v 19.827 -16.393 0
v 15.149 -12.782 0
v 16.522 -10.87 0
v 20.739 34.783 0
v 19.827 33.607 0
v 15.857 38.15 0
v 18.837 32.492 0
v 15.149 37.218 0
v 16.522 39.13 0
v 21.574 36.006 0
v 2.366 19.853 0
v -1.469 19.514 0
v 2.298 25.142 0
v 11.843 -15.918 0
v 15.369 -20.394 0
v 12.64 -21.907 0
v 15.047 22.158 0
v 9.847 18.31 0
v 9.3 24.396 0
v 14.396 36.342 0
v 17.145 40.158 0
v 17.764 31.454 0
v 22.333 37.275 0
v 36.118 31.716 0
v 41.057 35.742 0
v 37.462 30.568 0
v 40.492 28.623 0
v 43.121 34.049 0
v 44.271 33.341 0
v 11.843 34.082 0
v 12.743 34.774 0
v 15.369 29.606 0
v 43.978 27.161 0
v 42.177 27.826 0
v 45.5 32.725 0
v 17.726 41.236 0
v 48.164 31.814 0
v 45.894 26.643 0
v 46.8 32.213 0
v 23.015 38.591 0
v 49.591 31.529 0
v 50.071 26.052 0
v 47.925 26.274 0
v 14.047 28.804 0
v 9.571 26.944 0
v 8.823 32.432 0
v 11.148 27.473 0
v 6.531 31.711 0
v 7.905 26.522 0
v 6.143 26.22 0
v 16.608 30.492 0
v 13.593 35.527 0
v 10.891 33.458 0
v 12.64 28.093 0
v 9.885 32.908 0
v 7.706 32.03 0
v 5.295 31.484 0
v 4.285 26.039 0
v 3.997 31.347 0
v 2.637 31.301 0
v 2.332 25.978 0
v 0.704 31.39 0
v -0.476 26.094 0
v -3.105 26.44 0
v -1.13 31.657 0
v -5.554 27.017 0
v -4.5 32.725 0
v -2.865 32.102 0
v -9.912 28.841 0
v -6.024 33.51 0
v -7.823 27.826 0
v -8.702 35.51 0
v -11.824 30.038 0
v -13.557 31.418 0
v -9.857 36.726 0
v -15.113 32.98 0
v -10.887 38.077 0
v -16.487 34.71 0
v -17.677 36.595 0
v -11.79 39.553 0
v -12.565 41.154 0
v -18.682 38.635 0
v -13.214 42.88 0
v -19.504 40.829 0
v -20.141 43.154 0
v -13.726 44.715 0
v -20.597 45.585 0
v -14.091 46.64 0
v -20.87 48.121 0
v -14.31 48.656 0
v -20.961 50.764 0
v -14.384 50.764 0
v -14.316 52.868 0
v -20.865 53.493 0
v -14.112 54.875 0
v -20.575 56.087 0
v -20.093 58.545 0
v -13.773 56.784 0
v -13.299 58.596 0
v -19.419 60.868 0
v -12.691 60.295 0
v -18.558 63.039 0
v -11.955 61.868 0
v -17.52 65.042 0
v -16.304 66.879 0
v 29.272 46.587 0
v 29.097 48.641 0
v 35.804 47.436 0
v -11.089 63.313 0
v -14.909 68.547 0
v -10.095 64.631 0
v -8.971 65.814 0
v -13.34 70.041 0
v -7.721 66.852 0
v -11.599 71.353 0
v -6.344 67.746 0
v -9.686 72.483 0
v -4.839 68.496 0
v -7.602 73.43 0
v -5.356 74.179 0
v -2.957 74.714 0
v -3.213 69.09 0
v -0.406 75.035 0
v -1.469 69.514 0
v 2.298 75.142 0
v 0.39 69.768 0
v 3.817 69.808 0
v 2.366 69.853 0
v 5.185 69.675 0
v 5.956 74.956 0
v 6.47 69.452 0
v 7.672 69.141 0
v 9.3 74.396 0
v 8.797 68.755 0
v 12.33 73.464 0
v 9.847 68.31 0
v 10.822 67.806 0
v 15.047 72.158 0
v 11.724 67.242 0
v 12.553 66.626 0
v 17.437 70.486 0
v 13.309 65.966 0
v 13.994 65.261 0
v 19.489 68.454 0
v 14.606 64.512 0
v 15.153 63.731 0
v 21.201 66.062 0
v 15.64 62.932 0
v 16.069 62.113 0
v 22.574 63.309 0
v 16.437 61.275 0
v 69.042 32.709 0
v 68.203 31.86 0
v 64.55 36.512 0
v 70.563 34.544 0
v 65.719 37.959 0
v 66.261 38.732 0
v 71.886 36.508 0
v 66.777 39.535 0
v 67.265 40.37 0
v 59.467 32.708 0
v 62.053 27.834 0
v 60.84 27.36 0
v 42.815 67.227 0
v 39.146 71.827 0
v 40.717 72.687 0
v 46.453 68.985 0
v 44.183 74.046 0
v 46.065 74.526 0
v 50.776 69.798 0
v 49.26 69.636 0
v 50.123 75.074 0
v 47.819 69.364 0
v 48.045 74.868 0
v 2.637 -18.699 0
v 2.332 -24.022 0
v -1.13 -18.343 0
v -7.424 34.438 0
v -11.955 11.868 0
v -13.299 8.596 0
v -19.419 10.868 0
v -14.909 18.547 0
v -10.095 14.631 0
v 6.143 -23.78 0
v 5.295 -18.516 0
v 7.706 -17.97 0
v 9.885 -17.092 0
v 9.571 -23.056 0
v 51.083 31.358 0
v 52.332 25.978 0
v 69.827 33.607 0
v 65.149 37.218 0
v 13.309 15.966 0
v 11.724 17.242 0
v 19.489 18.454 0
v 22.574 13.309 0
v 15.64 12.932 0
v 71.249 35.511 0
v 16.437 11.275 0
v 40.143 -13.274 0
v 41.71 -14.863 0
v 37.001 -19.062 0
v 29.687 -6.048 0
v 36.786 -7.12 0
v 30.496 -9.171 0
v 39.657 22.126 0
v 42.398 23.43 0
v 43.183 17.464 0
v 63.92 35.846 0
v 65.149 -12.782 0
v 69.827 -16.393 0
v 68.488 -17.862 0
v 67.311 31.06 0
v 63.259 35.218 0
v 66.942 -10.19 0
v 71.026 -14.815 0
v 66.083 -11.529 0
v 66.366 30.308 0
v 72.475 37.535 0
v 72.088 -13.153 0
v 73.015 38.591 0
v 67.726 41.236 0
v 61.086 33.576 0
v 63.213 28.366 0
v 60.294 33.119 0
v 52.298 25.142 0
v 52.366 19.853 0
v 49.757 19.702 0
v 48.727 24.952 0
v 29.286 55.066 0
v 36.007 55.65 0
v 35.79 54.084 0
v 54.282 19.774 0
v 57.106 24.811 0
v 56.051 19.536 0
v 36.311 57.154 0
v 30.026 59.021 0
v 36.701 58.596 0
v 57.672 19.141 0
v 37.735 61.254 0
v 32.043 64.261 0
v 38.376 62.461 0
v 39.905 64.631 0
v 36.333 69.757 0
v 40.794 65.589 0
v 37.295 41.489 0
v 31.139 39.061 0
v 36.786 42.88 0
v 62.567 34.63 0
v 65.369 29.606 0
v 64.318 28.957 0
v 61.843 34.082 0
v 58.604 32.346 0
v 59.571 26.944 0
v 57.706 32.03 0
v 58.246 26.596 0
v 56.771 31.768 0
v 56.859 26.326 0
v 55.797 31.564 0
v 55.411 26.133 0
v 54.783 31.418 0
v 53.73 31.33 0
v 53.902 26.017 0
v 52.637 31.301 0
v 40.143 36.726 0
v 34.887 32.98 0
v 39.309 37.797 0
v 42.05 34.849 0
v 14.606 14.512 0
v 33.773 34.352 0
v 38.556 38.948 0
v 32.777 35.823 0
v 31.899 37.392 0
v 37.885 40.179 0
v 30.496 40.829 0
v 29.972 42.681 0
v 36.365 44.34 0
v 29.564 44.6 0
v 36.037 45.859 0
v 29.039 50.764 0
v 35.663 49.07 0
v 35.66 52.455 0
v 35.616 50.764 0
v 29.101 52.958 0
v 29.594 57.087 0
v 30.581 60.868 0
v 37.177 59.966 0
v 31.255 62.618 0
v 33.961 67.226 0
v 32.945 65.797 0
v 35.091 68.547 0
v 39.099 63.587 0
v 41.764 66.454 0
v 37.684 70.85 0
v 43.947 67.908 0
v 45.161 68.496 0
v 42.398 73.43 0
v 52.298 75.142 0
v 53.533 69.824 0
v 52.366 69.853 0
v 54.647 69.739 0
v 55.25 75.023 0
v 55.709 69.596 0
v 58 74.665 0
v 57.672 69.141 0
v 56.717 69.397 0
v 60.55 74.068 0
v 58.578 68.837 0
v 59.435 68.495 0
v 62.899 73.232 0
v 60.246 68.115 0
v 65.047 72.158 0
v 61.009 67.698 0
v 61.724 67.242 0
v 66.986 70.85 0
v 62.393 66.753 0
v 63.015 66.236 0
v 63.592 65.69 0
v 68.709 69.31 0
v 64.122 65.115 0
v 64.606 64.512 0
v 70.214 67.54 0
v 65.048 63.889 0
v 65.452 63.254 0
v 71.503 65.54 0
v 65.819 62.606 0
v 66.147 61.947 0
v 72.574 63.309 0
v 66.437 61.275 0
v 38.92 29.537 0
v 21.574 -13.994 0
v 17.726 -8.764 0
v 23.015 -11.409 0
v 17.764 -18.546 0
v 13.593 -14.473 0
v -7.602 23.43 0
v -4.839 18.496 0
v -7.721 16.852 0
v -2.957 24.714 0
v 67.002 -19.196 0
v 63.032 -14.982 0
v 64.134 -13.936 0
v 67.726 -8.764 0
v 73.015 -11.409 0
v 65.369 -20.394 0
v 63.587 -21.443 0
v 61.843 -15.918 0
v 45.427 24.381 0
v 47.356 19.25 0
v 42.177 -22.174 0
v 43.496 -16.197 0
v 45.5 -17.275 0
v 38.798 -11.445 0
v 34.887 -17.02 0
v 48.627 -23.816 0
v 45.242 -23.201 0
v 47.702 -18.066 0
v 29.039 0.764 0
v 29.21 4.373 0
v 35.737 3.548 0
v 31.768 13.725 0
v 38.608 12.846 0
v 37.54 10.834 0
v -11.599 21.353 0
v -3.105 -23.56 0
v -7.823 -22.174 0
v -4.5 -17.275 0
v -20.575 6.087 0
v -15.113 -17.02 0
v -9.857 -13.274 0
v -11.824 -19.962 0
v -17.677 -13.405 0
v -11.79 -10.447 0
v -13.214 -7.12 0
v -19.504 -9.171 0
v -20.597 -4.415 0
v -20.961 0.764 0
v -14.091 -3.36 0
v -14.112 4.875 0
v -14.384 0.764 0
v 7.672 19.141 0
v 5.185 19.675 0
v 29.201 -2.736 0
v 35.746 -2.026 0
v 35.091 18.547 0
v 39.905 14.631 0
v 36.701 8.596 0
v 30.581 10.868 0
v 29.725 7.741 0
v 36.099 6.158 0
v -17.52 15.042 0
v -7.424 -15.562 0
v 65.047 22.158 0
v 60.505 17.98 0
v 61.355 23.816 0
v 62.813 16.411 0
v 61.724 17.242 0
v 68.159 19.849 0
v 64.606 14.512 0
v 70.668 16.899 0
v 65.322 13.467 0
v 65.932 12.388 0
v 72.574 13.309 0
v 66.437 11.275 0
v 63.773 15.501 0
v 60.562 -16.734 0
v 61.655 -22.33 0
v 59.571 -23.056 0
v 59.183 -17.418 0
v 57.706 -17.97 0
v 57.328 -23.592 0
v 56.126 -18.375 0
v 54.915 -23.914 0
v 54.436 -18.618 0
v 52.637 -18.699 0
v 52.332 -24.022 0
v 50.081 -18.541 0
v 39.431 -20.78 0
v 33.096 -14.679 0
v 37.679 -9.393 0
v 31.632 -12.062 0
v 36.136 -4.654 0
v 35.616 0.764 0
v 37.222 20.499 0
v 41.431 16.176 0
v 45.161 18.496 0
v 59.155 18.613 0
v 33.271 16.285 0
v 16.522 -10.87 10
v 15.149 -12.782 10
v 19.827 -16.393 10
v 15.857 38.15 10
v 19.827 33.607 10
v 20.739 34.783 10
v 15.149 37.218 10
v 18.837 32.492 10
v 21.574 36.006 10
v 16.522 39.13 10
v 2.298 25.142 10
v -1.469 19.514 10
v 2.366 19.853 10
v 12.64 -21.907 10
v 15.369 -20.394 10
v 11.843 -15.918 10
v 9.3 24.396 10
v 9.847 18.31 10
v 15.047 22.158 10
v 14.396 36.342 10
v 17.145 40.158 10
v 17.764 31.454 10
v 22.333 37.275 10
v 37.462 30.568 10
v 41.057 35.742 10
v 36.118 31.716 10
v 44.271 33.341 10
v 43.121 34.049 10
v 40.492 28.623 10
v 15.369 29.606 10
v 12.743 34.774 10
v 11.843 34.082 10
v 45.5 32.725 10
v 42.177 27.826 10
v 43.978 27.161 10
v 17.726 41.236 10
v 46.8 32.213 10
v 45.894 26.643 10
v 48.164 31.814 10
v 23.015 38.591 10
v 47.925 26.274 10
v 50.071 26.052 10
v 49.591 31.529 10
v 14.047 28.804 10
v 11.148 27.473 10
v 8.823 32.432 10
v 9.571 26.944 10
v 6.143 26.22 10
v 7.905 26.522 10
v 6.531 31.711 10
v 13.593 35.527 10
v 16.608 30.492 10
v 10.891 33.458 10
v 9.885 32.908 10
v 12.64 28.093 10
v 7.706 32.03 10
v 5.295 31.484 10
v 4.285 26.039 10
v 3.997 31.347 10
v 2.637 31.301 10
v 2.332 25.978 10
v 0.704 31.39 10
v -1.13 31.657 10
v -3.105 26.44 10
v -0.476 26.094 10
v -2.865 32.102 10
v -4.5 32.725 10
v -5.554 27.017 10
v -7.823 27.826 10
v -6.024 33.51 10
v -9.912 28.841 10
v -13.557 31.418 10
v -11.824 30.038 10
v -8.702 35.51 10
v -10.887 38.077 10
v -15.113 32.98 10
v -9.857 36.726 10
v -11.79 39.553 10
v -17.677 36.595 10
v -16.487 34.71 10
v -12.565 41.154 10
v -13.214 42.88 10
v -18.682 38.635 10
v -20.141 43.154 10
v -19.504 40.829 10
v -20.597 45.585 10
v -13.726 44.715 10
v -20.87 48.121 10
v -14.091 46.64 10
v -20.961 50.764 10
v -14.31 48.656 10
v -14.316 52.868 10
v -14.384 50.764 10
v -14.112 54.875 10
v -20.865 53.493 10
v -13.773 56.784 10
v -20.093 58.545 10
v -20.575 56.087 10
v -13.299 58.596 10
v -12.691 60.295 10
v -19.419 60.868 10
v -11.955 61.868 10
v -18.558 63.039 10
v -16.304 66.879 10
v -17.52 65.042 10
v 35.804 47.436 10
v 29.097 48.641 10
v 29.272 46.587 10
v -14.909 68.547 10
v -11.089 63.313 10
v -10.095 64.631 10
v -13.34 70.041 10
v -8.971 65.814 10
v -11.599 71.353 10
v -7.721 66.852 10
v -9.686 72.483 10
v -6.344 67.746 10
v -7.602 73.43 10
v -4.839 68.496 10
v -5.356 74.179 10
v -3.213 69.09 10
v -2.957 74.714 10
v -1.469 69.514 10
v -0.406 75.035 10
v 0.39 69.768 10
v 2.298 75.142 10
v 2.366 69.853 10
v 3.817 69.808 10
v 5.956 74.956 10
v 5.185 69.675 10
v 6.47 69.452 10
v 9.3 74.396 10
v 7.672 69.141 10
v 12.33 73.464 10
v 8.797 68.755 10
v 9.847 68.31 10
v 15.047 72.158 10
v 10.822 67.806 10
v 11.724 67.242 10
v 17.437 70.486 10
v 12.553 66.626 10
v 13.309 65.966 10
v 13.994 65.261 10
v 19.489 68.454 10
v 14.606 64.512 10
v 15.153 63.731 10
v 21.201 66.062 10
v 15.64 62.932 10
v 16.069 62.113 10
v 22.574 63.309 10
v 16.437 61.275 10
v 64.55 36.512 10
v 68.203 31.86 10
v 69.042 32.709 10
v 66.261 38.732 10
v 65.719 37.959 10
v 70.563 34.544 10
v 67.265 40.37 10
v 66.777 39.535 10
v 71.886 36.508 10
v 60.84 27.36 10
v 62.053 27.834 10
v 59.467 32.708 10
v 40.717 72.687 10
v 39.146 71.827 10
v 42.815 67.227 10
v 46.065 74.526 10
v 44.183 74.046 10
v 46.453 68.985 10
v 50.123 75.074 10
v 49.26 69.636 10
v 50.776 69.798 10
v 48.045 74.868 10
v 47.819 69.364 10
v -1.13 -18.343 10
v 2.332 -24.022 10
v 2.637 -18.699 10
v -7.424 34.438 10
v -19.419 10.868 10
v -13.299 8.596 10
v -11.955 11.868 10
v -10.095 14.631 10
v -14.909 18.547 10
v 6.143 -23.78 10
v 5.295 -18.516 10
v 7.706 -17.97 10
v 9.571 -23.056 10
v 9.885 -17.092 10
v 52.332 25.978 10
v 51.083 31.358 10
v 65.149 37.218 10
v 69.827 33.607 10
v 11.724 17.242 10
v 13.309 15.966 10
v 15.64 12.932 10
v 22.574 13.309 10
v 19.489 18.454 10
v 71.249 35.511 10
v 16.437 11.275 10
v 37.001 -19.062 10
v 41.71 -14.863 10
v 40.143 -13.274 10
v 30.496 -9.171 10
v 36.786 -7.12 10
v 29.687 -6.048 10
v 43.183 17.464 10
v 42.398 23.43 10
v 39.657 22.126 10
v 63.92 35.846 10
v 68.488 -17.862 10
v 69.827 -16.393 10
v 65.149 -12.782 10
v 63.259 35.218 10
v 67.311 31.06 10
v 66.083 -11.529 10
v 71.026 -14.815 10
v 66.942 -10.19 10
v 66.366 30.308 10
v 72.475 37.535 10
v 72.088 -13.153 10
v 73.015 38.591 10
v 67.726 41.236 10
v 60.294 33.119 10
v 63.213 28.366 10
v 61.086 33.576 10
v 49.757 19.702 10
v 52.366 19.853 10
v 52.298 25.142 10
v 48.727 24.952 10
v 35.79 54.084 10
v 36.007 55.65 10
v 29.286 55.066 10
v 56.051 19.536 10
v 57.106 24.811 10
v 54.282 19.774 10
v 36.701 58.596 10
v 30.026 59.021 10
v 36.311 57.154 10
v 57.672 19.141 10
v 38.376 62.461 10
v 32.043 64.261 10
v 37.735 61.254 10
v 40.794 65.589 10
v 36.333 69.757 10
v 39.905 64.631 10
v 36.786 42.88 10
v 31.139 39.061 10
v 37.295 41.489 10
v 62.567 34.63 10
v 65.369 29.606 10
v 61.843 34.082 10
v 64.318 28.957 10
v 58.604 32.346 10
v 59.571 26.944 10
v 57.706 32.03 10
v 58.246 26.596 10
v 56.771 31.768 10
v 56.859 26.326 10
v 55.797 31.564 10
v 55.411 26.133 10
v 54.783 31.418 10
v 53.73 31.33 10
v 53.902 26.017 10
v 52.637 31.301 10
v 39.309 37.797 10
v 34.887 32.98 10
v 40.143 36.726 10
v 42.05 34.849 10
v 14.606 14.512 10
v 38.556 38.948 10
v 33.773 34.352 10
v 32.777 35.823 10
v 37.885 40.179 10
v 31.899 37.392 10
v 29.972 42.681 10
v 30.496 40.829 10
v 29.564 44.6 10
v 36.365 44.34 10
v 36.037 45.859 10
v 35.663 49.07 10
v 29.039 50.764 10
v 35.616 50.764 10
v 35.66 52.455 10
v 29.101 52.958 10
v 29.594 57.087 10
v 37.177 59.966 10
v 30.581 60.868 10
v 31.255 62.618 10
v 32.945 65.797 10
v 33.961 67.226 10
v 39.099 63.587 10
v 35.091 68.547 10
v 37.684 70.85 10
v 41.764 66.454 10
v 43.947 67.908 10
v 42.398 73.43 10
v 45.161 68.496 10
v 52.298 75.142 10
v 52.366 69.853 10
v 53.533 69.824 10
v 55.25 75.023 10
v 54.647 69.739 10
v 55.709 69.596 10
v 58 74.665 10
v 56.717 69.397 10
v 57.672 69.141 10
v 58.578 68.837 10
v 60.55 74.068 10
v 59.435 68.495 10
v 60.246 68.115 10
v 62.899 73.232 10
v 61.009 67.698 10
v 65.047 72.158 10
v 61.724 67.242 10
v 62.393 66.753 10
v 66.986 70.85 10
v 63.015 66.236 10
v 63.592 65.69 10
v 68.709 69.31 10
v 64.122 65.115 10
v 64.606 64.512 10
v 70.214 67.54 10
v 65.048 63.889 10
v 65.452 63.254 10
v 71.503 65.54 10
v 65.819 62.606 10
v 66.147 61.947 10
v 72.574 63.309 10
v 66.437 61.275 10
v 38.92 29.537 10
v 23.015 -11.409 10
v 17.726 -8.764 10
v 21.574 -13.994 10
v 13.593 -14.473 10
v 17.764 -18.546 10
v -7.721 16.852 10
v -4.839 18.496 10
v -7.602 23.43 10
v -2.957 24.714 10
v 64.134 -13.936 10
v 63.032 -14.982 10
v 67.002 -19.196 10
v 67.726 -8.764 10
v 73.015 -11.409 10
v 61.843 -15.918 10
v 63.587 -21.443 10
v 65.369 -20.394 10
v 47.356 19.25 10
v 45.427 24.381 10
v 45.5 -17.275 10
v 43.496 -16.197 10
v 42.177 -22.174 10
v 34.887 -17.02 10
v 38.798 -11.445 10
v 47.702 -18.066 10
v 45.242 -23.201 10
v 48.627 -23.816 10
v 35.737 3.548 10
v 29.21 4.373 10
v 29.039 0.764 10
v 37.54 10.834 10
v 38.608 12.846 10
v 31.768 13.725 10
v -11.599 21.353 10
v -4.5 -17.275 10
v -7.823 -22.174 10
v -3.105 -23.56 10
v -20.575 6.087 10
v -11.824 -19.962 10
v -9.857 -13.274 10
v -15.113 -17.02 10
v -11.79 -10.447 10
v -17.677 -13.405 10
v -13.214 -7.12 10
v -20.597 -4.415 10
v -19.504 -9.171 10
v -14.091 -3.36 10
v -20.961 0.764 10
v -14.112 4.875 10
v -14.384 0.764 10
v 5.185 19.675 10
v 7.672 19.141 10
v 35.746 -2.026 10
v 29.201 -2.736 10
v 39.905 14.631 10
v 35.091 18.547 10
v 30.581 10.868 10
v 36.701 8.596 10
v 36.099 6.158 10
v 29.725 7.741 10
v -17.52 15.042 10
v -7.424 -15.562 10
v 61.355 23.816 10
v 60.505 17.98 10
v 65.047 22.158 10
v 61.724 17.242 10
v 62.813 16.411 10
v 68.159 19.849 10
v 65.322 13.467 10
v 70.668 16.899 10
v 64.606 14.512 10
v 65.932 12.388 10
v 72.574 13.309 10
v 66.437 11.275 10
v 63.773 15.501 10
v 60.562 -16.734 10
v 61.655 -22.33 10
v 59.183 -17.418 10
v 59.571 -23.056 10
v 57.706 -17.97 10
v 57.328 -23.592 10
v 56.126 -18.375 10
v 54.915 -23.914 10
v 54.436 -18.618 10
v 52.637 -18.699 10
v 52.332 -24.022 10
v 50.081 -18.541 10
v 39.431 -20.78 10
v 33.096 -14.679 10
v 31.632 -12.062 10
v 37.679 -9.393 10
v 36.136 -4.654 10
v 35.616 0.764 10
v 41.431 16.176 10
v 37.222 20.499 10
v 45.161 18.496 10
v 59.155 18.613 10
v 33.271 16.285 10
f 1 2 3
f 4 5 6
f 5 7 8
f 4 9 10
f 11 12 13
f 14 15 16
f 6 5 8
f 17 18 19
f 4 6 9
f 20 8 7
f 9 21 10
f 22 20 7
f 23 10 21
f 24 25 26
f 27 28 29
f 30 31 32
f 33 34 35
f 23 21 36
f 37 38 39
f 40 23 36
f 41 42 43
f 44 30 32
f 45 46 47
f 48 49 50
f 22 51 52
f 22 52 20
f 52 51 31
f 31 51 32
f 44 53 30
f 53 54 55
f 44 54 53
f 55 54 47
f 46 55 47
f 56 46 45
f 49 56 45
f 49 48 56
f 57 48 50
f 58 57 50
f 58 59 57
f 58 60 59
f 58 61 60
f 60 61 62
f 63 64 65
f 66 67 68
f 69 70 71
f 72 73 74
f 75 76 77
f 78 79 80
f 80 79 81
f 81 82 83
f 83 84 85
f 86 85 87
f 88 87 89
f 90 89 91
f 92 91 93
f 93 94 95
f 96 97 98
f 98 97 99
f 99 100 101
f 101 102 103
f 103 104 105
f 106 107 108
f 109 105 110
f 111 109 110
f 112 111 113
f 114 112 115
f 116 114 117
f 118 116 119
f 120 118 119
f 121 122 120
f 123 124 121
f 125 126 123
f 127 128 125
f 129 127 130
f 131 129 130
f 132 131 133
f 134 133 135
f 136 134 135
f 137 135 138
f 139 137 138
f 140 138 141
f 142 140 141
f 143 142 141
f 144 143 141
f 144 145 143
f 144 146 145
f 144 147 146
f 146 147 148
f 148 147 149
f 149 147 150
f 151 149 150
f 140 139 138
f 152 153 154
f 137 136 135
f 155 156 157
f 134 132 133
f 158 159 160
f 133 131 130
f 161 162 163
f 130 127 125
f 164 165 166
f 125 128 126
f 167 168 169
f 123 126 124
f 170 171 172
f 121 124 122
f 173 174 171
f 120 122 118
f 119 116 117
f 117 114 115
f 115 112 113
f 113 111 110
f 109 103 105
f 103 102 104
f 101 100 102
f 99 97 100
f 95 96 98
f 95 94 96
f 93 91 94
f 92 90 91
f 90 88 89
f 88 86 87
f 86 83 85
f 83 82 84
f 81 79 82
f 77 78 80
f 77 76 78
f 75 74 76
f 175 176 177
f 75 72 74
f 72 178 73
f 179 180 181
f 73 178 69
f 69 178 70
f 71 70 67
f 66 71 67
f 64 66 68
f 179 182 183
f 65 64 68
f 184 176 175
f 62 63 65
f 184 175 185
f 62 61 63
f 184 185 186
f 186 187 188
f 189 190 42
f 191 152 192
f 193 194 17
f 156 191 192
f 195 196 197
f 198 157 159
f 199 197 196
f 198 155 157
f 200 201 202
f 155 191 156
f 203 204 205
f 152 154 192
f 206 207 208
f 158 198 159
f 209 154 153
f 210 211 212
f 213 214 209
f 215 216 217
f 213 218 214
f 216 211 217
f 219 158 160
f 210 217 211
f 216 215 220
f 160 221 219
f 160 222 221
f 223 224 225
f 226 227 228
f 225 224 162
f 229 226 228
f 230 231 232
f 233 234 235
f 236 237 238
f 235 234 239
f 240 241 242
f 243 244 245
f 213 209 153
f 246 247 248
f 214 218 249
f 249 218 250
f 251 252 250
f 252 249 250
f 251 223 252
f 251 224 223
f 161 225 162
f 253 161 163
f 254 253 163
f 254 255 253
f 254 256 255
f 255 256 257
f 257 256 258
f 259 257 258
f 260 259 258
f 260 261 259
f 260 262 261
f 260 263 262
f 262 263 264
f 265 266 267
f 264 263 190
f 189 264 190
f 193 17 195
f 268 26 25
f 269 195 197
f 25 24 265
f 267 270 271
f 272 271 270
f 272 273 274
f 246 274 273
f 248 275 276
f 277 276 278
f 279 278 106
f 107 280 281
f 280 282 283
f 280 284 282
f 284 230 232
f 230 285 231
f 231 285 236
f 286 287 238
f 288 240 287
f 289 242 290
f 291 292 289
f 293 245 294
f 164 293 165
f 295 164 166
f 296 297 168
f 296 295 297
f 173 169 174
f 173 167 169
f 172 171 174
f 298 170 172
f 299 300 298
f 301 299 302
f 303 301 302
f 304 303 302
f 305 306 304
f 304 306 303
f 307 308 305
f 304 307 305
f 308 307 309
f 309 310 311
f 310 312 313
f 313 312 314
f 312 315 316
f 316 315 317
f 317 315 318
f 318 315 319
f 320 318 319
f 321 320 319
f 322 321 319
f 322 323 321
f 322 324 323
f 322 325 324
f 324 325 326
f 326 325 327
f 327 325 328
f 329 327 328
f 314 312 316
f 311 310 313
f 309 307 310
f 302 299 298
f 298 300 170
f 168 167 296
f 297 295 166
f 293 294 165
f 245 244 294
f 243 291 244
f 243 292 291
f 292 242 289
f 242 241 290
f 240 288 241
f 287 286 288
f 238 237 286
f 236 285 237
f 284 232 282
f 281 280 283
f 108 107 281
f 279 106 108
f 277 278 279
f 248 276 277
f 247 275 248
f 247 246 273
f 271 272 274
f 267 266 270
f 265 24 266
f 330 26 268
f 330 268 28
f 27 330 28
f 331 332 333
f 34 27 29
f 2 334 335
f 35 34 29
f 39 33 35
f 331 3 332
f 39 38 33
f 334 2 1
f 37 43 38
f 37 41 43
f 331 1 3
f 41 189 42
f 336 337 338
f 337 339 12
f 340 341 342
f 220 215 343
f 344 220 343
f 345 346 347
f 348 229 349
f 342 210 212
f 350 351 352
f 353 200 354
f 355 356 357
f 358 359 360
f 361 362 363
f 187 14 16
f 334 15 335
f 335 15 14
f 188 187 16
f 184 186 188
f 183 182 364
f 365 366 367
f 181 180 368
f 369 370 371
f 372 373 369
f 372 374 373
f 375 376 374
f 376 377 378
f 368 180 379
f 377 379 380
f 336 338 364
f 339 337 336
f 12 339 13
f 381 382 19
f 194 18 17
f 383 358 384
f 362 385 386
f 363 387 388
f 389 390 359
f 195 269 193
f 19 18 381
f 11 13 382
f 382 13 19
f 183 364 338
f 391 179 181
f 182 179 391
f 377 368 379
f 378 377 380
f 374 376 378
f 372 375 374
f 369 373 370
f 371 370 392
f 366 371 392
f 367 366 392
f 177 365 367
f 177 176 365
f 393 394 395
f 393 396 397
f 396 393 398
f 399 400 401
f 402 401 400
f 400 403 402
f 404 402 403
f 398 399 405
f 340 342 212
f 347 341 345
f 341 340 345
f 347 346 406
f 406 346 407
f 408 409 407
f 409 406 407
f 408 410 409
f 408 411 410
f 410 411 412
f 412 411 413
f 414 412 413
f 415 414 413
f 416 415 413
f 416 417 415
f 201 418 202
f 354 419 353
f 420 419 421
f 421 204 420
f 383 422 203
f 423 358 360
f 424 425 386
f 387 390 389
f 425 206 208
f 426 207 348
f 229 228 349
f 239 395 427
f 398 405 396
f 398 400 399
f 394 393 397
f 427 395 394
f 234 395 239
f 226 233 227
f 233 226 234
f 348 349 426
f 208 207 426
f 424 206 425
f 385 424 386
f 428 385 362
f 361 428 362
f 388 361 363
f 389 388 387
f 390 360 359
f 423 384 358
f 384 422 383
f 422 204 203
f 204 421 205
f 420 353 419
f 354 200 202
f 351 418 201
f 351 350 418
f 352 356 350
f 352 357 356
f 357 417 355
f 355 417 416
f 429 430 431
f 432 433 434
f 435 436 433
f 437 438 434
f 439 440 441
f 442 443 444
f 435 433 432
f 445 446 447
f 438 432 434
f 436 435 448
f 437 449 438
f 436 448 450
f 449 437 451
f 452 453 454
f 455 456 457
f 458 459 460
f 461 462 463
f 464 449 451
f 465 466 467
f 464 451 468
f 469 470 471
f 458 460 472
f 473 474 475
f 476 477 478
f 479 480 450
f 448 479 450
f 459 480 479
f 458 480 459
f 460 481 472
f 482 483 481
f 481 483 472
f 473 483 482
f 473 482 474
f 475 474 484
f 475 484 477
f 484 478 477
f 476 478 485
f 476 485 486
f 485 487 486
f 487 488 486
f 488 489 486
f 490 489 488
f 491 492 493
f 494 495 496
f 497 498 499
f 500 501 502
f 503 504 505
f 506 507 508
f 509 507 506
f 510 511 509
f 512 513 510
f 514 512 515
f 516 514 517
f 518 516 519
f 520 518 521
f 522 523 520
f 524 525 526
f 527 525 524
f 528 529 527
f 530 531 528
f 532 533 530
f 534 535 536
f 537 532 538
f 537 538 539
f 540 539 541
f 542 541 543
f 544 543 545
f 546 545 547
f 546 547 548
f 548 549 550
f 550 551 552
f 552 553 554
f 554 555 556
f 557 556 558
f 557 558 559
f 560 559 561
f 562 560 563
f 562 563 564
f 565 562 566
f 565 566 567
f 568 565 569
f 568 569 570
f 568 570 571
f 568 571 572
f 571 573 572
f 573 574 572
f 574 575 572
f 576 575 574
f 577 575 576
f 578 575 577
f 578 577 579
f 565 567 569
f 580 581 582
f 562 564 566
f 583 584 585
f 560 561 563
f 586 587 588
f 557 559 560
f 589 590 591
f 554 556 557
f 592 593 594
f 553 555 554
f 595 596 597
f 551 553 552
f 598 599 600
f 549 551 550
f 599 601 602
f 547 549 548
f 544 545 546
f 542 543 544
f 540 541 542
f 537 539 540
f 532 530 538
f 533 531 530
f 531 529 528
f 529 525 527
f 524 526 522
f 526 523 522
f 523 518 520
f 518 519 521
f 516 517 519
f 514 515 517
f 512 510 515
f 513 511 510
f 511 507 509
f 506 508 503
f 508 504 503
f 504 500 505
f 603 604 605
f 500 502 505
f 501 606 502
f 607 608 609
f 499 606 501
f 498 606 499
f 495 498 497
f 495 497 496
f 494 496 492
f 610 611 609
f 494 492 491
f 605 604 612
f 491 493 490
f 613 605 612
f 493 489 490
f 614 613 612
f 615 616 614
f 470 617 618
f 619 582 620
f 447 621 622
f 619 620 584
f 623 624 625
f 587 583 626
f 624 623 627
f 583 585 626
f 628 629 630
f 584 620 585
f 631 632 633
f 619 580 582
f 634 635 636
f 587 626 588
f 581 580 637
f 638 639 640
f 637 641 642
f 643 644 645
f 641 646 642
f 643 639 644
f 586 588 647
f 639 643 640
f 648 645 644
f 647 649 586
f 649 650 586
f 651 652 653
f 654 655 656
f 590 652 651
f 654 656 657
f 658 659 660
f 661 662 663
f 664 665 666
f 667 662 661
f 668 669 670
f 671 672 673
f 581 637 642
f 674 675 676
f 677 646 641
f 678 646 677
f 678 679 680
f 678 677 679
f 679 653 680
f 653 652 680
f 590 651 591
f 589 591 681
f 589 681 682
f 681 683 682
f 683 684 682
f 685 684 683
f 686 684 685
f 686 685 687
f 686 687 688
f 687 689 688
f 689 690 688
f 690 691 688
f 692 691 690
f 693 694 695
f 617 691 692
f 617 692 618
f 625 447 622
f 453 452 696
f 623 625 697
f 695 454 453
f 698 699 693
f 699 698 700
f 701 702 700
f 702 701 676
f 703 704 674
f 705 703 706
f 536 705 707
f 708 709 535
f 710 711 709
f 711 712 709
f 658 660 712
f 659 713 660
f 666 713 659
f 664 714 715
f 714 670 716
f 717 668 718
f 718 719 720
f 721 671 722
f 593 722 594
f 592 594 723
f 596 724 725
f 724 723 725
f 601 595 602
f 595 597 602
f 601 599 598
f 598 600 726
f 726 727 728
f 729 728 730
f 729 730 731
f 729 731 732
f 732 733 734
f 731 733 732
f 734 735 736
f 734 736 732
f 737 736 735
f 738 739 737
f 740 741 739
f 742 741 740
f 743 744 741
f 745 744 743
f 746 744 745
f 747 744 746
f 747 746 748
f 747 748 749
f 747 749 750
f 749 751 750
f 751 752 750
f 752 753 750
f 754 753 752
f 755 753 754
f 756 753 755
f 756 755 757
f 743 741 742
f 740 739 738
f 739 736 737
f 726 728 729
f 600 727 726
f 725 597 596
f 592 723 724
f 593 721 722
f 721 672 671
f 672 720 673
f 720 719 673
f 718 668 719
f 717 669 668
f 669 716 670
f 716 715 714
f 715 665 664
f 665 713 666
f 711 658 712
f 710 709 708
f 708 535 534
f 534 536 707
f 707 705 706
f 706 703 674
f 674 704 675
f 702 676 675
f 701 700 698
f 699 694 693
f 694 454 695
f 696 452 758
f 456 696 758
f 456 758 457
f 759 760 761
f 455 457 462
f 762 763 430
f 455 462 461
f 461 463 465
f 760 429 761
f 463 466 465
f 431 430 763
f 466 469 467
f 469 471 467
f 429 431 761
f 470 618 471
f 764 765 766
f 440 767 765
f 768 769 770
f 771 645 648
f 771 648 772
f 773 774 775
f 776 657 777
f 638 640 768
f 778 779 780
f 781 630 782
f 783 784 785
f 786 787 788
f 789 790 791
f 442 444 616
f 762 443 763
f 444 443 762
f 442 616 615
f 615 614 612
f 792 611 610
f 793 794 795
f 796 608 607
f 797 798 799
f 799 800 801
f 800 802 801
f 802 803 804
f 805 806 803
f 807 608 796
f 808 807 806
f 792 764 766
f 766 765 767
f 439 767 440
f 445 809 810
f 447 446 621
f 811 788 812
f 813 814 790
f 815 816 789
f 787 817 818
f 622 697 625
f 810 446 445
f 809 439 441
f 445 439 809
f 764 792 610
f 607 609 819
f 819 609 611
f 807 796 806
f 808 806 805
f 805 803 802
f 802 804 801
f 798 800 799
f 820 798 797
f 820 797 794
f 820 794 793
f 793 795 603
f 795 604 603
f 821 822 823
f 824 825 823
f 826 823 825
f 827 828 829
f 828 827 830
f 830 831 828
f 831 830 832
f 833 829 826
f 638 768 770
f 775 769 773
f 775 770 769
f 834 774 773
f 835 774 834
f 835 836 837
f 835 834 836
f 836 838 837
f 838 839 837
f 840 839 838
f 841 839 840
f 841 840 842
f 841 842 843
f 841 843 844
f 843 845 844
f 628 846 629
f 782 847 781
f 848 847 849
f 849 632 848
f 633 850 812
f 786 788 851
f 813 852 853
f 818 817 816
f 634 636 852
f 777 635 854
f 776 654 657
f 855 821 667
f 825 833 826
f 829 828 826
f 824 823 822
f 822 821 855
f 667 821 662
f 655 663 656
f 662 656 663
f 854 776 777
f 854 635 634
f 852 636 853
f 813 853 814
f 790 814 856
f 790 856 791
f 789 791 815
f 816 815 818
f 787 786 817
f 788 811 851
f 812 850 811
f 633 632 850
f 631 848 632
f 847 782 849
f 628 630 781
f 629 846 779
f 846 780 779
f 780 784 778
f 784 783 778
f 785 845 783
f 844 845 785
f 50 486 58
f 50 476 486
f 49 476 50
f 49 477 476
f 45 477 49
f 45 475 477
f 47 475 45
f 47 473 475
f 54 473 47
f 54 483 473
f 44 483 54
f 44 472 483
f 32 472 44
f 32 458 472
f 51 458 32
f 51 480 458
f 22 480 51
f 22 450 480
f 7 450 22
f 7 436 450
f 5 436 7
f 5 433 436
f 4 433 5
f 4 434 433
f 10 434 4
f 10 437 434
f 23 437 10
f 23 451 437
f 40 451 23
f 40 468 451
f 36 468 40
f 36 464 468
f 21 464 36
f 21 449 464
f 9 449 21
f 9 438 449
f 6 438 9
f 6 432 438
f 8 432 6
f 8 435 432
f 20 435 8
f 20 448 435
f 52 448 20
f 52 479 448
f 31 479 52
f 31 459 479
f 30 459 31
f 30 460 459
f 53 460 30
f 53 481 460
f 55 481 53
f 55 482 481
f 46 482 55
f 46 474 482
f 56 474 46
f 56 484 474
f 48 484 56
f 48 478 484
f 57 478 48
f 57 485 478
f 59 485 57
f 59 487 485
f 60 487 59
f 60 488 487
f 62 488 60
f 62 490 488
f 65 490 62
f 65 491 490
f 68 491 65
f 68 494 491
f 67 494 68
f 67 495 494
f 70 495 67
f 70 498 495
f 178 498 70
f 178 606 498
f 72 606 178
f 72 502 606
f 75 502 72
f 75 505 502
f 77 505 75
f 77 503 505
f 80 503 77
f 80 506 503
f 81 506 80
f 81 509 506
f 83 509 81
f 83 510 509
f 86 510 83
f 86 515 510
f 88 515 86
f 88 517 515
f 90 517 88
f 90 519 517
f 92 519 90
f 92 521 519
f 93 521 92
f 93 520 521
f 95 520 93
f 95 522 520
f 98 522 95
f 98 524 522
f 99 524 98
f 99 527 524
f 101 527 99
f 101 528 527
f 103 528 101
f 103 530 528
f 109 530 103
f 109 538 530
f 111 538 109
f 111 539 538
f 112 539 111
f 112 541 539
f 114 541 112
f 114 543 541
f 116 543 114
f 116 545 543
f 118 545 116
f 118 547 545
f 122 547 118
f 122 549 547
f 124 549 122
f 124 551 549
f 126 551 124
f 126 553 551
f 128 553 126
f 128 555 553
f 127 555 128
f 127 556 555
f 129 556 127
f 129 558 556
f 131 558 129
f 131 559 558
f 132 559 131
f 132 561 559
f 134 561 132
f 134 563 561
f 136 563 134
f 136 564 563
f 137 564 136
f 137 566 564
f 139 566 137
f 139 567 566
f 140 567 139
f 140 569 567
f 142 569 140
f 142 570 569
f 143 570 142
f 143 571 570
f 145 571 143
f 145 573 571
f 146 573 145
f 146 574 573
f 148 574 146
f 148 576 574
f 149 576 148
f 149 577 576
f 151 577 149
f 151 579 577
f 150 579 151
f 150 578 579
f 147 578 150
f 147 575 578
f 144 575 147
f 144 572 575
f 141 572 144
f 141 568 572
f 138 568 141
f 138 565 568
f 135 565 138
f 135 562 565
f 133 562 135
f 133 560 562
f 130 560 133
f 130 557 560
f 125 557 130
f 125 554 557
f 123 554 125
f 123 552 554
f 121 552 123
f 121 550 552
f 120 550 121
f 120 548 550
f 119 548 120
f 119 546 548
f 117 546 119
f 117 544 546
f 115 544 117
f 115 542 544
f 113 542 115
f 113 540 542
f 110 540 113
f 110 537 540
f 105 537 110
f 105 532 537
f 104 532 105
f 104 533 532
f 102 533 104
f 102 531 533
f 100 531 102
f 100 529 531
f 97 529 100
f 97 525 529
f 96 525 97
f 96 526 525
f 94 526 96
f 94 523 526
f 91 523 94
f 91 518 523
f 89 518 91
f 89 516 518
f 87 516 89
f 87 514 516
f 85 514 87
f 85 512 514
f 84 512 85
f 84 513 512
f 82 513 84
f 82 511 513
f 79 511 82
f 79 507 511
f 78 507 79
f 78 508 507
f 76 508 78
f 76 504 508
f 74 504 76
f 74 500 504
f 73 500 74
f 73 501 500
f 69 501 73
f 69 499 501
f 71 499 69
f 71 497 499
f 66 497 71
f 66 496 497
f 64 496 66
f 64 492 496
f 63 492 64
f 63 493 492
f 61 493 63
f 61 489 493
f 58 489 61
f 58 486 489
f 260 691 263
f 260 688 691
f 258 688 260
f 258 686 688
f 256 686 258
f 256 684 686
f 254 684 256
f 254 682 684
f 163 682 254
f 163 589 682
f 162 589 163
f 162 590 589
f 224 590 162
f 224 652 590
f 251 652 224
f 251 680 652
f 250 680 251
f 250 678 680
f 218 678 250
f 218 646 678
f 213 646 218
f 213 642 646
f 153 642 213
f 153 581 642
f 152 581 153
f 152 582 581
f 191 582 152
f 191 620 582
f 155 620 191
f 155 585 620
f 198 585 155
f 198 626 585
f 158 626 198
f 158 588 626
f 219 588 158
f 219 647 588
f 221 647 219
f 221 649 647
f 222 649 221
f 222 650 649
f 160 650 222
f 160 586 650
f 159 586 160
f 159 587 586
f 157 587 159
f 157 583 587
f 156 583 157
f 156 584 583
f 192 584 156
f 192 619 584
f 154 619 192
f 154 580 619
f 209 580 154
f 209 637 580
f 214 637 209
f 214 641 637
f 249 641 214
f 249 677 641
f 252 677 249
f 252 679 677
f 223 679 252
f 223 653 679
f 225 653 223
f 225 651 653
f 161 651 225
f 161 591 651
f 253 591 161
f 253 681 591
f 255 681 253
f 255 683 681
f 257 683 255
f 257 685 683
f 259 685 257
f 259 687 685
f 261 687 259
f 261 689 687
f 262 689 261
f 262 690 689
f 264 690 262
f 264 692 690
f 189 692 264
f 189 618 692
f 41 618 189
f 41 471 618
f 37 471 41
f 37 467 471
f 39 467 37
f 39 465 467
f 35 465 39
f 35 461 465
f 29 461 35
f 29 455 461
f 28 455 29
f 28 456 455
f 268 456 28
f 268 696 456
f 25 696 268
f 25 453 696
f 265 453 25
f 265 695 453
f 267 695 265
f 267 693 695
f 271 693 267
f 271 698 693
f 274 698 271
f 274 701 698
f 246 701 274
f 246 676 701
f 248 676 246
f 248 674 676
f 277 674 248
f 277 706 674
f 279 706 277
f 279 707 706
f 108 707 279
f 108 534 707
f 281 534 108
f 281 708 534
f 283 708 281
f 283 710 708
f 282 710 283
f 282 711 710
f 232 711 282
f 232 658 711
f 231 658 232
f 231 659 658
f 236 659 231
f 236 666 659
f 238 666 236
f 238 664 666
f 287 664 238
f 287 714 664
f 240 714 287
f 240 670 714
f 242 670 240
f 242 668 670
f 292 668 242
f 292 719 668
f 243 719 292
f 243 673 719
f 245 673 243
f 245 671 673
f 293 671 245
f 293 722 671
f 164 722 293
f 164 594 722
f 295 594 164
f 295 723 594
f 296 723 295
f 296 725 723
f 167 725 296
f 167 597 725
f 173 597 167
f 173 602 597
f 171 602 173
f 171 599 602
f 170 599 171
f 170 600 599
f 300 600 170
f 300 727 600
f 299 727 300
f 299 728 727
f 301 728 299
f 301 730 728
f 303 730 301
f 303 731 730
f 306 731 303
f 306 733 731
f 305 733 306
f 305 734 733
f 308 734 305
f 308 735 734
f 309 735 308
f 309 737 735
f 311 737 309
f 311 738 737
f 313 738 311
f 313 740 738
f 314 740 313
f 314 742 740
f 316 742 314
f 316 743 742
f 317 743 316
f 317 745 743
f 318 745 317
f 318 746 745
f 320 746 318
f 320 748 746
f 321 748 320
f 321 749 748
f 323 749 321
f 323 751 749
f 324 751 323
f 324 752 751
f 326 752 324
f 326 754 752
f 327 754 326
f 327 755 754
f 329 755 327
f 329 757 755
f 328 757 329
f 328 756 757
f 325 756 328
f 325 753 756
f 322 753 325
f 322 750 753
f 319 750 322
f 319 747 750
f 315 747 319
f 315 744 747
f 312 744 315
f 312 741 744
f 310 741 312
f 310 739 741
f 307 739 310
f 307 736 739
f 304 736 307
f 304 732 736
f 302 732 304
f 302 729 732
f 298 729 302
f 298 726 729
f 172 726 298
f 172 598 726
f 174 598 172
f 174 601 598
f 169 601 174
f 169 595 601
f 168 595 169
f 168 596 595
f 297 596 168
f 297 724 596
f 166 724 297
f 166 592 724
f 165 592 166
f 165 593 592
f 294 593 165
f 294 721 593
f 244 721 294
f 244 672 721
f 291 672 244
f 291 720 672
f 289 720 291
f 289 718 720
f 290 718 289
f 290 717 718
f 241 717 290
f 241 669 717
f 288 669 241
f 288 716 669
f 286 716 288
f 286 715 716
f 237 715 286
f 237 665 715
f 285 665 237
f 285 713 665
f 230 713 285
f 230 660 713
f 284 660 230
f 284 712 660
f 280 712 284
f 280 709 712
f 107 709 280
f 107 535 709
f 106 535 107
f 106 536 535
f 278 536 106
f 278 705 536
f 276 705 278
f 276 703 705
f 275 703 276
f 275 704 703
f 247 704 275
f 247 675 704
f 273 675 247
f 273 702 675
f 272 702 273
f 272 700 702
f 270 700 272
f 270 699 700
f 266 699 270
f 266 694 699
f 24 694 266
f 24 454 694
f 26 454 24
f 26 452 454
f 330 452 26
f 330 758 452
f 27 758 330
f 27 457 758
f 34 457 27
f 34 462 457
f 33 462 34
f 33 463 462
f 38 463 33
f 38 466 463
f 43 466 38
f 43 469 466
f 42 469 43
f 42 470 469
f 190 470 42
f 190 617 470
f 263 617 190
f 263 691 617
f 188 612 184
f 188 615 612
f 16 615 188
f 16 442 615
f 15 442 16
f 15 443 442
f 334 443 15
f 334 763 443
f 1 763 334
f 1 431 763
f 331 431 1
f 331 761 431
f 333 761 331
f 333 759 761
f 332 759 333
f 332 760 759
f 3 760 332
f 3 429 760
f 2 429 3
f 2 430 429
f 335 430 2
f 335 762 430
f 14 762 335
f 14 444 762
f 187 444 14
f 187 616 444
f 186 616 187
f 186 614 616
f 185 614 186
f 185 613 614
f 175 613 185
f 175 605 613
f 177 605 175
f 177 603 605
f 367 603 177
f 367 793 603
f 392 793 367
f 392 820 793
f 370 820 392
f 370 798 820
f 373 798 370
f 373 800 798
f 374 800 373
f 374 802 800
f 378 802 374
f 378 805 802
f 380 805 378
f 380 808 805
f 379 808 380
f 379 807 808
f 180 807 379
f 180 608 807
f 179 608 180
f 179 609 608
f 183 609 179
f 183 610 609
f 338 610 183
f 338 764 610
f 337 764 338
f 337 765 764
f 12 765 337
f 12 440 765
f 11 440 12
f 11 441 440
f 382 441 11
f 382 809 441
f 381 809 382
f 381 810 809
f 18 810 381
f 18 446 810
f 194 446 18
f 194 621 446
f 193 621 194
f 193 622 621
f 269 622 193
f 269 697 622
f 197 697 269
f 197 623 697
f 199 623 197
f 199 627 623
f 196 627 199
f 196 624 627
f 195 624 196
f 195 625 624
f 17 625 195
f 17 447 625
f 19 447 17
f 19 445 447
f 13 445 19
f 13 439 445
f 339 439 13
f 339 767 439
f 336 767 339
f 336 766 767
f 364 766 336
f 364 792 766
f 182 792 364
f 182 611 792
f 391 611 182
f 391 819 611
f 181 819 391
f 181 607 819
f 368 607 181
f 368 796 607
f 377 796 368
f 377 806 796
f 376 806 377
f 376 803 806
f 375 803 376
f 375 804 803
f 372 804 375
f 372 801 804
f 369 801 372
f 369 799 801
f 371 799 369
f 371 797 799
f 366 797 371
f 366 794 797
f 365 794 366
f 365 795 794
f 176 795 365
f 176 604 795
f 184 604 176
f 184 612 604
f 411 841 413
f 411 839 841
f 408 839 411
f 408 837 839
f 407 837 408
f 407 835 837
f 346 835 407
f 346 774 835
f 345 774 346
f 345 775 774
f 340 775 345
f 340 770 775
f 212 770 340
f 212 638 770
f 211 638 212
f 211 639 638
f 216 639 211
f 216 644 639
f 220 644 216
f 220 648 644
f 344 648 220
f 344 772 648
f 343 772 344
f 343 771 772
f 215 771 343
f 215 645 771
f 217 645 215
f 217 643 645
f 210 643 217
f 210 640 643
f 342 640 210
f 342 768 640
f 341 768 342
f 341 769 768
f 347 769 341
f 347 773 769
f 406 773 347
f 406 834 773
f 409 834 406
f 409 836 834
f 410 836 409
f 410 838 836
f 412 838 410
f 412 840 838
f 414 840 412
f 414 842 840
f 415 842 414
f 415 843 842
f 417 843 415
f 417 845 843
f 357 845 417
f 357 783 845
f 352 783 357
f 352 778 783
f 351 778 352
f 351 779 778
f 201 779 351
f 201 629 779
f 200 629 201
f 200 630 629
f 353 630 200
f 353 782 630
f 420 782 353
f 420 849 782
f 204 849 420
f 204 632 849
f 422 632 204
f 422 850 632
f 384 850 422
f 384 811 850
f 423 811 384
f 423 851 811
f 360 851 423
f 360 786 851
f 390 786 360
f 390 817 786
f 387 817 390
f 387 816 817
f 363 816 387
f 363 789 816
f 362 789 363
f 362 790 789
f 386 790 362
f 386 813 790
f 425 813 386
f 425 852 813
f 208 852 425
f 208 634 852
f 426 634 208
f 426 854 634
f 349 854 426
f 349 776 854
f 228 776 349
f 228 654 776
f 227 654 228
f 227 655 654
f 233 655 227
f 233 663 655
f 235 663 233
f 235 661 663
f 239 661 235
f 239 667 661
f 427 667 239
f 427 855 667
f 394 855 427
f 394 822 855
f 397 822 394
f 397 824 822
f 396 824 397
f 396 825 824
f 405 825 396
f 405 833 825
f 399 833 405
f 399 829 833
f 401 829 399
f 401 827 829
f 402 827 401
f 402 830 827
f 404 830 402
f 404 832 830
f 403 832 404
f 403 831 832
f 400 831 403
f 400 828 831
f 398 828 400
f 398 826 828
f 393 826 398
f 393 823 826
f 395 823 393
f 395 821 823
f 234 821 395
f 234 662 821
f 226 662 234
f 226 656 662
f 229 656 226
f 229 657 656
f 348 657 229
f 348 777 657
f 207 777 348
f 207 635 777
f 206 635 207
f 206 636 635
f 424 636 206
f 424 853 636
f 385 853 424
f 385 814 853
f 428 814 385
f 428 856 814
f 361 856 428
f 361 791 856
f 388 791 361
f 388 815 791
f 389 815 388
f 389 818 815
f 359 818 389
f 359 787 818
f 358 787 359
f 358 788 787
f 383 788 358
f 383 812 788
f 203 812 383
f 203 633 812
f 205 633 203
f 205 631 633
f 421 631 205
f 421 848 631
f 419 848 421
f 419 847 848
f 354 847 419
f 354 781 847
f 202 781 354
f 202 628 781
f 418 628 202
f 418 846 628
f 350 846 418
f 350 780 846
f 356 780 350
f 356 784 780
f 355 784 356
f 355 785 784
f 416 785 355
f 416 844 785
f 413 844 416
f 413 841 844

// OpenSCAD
module letter(c) {
    text(c, size = 50, font = "Liberation Sans", halign = "center", valign = "center");
}

linear_extrude(height = 10) {
    letter("C", $fn=8);
    translate([50,0]) letter("C", $fn=16);
    translate([0,50]) letter("C", $fn=24);
    translate([50,50]) letter("C", $fn=32);
}
